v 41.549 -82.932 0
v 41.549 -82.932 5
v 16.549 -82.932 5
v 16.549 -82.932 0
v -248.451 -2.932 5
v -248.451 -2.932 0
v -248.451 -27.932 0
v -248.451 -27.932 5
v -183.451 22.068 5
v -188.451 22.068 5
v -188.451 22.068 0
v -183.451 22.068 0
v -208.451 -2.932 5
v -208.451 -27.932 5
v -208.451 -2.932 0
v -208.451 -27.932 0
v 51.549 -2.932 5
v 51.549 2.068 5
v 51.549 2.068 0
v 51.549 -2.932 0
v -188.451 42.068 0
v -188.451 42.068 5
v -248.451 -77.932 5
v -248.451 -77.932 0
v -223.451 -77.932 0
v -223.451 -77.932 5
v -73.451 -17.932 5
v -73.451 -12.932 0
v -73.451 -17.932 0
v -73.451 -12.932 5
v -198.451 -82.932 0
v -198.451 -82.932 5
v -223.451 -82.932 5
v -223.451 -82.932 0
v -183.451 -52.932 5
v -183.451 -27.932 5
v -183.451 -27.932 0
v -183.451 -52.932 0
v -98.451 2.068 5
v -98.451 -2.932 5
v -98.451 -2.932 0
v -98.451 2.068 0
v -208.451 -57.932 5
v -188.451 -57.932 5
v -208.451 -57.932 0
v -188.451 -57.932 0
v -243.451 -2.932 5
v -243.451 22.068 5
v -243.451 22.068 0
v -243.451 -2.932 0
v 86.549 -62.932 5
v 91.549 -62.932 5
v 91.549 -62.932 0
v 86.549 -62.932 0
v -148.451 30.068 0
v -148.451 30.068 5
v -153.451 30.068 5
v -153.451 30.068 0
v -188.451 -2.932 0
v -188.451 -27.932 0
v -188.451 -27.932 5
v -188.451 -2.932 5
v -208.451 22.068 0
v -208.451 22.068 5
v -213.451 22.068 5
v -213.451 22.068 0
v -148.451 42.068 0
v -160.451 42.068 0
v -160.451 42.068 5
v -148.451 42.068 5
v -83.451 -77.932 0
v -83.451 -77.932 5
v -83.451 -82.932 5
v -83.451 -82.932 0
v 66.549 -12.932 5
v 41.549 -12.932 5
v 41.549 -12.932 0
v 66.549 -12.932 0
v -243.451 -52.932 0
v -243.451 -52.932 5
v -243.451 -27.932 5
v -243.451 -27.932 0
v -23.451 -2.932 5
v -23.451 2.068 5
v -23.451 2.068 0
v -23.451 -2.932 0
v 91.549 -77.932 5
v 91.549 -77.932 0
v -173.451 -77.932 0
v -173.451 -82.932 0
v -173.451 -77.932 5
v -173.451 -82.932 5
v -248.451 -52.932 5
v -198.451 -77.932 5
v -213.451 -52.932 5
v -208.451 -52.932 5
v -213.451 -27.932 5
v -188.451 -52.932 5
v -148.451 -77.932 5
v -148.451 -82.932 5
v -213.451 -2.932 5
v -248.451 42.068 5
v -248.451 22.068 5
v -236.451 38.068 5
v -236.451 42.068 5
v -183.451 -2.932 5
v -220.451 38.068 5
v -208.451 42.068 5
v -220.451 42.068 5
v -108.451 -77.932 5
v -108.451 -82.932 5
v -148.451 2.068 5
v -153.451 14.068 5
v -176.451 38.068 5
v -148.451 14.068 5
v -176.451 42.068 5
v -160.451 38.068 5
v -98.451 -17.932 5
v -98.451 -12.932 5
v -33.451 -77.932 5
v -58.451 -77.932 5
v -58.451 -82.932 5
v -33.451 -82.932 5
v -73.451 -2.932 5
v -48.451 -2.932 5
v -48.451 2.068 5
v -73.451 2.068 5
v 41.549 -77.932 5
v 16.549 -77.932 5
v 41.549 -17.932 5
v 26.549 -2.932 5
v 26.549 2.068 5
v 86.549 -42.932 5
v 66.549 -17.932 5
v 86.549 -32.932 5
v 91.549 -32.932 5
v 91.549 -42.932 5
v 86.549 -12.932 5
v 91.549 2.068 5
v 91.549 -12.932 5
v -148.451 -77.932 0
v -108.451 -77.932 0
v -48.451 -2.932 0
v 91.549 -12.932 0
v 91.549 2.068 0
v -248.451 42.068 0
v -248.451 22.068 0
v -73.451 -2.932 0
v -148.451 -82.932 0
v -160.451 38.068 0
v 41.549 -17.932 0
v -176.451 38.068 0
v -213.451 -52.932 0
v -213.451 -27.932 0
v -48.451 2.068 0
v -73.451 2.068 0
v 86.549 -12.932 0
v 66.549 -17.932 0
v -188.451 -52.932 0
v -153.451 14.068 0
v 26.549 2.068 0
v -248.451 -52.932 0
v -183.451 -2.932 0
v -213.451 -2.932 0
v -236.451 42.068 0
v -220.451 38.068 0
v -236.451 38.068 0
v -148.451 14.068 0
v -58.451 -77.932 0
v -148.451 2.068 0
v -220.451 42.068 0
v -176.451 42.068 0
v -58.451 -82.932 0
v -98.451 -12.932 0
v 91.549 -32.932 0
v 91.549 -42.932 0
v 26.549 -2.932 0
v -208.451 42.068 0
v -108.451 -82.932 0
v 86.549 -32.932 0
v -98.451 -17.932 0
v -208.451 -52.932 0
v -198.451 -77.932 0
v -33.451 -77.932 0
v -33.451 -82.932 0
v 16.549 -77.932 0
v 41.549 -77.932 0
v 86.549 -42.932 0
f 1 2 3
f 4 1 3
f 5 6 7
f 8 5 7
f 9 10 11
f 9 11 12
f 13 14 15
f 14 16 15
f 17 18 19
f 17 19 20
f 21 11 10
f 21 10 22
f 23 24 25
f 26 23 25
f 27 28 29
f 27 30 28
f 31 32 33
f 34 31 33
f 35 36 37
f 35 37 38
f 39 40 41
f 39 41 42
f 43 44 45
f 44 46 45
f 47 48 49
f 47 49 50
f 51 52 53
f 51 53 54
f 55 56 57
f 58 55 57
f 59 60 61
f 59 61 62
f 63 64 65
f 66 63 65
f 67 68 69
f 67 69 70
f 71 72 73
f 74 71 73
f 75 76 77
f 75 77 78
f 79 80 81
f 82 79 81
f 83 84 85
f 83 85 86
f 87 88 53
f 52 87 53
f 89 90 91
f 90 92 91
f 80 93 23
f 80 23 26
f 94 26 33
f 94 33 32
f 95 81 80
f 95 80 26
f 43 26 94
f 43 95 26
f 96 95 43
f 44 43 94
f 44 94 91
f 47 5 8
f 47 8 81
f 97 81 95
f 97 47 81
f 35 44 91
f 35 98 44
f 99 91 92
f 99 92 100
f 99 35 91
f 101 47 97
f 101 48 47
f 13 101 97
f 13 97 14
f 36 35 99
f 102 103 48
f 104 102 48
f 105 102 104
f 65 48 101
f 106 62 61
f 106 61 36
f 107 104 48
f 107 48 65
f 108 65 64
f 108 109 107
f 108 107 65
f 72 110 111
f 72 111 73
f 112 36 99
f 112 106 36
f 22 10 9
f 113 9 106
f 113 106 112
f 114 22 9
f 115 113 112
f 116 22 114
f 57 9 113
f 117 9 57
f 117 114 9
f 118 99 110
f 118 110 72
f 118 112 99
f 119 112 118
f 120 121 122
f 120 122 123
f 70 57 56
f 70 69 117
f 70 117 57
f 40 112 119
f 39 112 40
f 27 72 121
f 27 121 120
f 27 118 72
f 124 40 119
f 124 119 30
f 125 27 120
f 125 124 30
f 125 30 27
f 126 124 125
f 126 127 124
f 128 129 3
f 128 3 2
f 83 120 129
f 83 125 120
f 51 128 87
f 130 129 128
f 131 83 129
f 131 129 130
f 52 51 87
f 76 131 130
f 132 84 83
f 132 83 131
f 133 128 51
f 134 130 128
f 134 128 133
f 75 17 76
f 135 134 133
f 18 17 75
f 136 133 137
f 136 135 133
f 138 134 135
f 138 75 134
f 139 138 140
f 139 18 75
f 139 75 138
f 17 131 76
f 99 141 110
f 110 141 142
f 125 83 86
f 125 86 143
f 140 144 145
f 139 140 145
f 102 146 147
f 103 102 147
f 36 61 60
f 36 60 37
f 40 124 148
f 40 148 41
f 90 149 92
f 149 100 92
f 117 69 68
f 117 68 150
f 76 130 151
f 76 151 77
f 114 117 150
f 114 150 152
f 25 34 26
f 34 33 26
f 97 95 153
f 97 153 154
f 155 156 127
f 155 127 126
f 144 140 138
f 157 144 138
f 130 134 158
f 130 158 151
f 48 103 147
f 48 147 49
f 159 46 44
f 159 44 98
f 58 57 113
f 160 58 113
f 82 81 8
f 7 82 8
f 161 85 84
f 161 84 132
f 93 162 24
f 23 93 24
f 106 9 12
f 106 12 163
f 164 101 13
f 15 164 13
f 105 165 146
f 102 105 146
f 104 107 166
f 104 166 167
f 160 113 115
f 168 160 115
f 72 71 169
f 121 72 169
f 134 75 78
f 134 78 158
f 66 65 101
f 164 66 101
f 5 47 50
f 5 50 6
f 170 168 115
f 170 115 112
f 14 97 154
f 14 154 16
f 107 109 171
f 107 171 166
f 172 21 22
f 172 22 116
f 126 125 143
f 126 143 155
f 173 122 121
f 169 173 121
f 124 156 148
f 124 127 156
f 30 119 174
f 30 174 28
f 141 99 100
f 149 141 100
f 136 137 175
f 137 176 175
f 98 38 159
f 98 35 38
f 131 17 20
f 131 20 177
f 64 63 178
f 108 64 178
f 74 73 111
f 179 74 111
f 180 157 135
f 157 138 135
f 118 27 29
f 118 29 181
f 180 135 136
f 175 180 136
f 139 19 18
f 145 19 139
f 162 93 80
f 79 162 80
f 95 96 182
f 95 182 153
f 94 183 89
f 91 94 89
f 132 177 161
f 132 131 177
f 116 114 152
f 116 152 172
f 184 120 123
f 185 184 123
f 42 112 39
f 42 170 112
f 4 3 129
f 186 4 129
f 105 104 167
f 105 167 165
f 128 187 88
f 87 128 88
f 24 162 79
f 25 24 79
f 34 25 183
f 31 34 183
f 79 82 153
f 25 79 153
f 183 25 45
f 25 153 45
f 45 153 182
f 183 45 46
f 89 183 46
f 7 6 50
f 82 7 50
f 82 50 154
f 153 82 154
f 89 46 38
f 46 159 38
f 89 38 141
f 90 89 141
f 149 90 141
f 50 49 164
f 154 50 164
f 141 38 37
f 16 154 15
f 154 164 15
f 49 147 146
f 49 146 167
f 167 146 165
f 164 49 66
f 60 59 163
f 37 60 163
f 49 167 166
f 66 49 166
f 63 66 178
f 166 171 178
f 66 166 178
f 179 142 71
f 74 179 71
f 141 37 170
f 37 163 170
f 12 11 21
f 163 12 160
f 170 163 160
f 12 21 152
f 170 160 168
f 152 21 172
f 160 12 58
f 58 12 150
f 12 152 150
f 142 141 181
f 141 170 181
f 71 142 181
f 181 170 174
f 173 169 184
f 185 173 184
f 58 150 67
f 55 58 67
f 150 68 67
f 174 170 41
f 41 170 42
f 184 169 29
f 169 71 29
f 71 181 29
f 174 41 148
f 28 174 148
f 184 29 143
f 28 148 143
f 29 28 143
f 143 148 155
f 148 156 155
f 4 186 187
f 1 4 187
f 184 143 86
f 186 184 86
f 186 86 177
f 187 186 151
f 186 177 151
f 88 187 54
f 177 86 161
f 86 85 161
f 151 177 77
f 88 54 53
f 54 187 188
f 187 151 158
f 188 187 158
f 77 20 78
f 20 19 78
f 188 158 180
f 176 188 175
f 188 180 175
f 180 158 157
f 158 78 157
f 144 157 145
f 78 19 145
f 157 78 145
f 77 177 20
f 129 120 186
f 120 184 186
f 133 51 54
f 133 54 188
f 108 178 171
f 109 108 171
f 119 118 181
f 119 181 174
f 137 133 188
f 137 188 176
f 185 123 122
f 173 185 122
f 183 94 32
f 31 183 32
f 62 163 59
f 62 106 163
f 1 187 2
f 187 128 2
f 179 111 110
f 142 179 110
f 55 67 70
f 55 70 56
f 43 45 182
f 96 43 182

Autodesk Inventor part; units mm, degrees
ref_plane "YZ Plane" through (0, 0, 0) normal (1, 0, 0) x (0, 1, 0)
ref_plane "XZ Plane" through (0, 0, 0) normal (0, 1, 0) x (-1, 0, 0)
ref_plane "XY Plane" through (0, 0, 0) normal (0, 0, 1) x (1, 0, 0)
sketch "Sketch1" plane through (0, 0, 0) normal (0, 0, 1) x (1, 0, 0)
  line L0 (-188.4506, 42.0684) -> (-148.4506, 42.0684)
  line L1 (-148.4506, 42.0684) -> (-148.4506, 2.0684)
  line L2 (-148.4506, 2.0684) -> (91.5494, 2.0684)
  line L3 (-198.4506, -77.9316) -> (91.5494, -77.9316)
  line L4 (91.5494, -77.9316) -> (91.5494, 2.0684)
  line L5 (-188.4506, -57.9316) -> (-208.4506, -57.9316)
  line L6 (-208.4506, -57.9316) -> (-208.4506, 42.0684)
  line L7 (-208.4506, 42.0684) -> (-248.4506, 42.0684)
  line L8 (-248.4506, 42.0684) -> (-248.4506, -77.9316)
  line L9 (-248.4506, -77.9316) -> (-198.4506, -77.9316)
  line L10 (-188.4506, -57.9316) -> (-188.4506, 42.0684)
  point P0 (0, 0)
  dimension "d2" = 80
  dimension "d3" = 40
  dimension "d23" = 40
  dimension "d24" = 20
  dimension "d26" = 20
  dimension "d27" = 120
  dimension "d28" = 120
  dimension "d58" = 280
extrude "Extrusion1" add sketch "Sketch1" along normal blind 5
sketch "Sketch2" plane through (0, 0, 5) normal (0, 0, 1) x (1, 0, 0)
  line L0 (91.5494, 2.0684) -> (-148.4506, 2.0684) projected
  line L1 (-148.4506, 2.0684) -> (-148.4506, 42.0684) projected
  line L2 (-148.4506, 42.0684) -> (-188.4506, 42.0684) projected
  line L3 (-248.4506, -77.9316) -> (91.5494, -77.9316) projected
  line L4 (91.5494, -77.9316) -> (91.5494, 2.0684) projected
  line L5 (91.5494, 2.0684) -> (-148.4506, 2.0684) projected
  line L6 (-98.4506, 2.0684) -> (-73.4506, 2.0684)
  line L7 (-73.4506, 2.0684) -> (-73.4506, -2.9316)
  line L8 (-73.4506, -2.9316) -> (-98.4506, -2.9316)
  line L9 (-98.4506, -2.9316) -> (-98.4506, 2.0684)
  line L10 (-48.4506, 2.0684) -> (-23.4506, 2.0684)
  line L11 (-23.4506, 2.0684) -> (-23.4506, -2.9316)
  line L12 (-23.4506, -2.9316) -> (-48.4506, -2.9316)
  line L13 (-48.4506, -2.9316) -> (-48.4506, 2.0684)
  line L14 (26.5494, 2.0684) -> (51.5494, 2.0684)
  line L15 (51.5494, 2.0684) -> (51.5494, -2.9316)
  line L16 (51.5494, -2.9316) -> (26.5494, -2.9316)
  line L17 (26.5494, -2.9316) -> (26.5494, 2.0684)
  line L18 (-148.4506, 42.0684) -> (-188.4506, 42.0684) projected
  line L19 (91.5494, -77.9316) -> (91.5494, 2.0684) projected
  line L20 (-73.4506, -7.9316) -> (-73.4506, -2.9316)
  line L21 (-98.4506, -2.9316) -> (-98.4506, -7.9316)
  line L22 (-23.4506, -7.9316) -> (-23.4506, -2.9316)
  line L23 (-48.4506, -2.9316) -> (-48.4506, -7.9316)
  line L24 (51.5494, -7.9316) -> (51.5494, -2.9316)
  line L25 (26.5494, -2.9316) -> (26.5494, -7.9316)
  line L26 (41.5494, -77.9316) -> (41.5494, -72.9316)
  line L27 (41.5494, -72.9316) -> (16.5494, -72.9316)
  line L28 (16.5494, -72.9316) -> (16.5494, -77.9316)
  line L29 (16.5494, -72.9316) -> (16.5494, -67.9316)
  line L30 (41.5494, -67.9316) -> (41.5494, -72.9316)
  line L31 (-188.4506, -57.9316) -> (-208.4506, -57.9316) projected
  line L32 (-208.4506, -57.9316) -> (-208.4506, 42.0684) projected
  line L33 (-208.4506, 42.0684) -> (-248.4506, 42.0684) projected
  line L34 (-248.4506, 42.0684) -> (-248.4506, -77.9316) projected
  line L35 (-188.4506, 42.0684) -> (-188.4506, -57.9316) projected
  line L36 (-208.4506, 42.0684) -> (-248.4506, 42.0684) projected
  line L37 (-236.4506, 42.0684) -> (-220.4506, 42.0684)
  line L38 (-220.4506, 42.0684) -> (-220.4506, 38.0682)
  line L39 (-220.4506, 38.0682) -> (-236.4506, 38.0682)
  line L40 (-236.4506, 38.0682) -> (-236.4506, 42.0684)
  line L41 (-148.4506, 42.0684) -> (-188.4506, 42.0684) projected
  line L42 (-176.4506, 42.0684) -> (-160.4506, 42.0684)
  line L43 (-160.4506, 42.0684) -> (-160.4506, 38.0682)
  line L44 (-160.4506, 38.0682) -> (-176.4506, 38.0682)
  line L45 (-176.4506, 38.0682) -> (-176.4506, 42.0684)
  line L46 (-248.4506, 42.0684) -> (-248.4506, -77.9316) projected
  line L47 (-248.4506, 22.0684) -> (-243.4506, 22.0684)
  line L48 (-243.4506, 22.0684) -> (-243.4506, -2.9316)
  line L49 (-243.4506, -2.9316) -> (-248.4506, -2.9316)
  line L50 (-248.4506, -2.9316) -> (-248.4506, 22.0684)
  line L51 (-248.4506, -52.9316) -> (-243.4506, -52.9316)
  line L52 (-243.4506, -52.9316) -> (-243.4506, -27.9316)
  line L53 (-243.4506, -27.9316) -> (-248.4506, -27.9316)
  line L54 (-248.4506, -27.9316) -> (-248.4506, -52.9316)
  line L55 (-188.4506, 42.0684) -> (-188.4506, -57.9316) projected
  line L56 (-188.4506, 22.0684) -> (-183.4506, 22.0684)
  line L57 (-183.4506, 22.0684) -> (-183.4506, -2.9316)
  line L58 (-183.4506, -2.9316) -> (-188.4506, -2.9316)
  line L59 (-188.4506, -2.9316) -> (-188.4506, 22.0684)
  line L60 (-188.4506, -27.9316) -> (-183.4506, -27.9316)
  line L61 (-183.4506, -27.9316) -> (-183.4506, -52.9316)
  line L62 (-183.4506, -52.9316) -> (-188.4506, -52.9316)
  line L63 (-188.4506, -52.9316) -> (-188.4506, -27.9316)
  line L64 (-208.4506, -57.9316) -> (-208.4506, 42.0684) projected
  line L65 (-208.4506, 22.0684) -> (-213.4506, 22.0684)
  line L66 (-213.4506, 22.0684) -> (-213.4506, -2.9316)
  line L67 (-213.4506, -2.9316) -> (-208.4506, -2.9316)
  line L68 (-208.4506, -2.9316) -> (-208.4506, 22.0684)
  line L69 (-208.4506, -52.9316) -> (-213.4506, -52.9316)
  line L70 (-213.4506, -52.9316) -> (-213.4506, -27.9316)
  line L71 (-213.4506, -27.9316) -> (-208.4506, -27.9316)
  line L72 (-208.4506, -27.9316) -> (-208.4506, -52.9316)
  line L73 (-148.4506, 2.0684) -> (-148.4506, 42.0684) projected
  line L74 (-148.4506, 30.0684) -> (-153.4506, 30.0684)
  line L75 (-153.4506, 30.0684) -> (-153.4506, 14.0684)
  line L76 (-153.4506, 14.0684) -> (-148.4506, 14.0684)
  line L77 (-148.4506, 14.0684) -> (-148.4506, 30.0684)
  line L78 (-248.4506, -77.9316) -> (91.5494, -77.9316) projected
  line L79 (-223.4506, -77.9316) -> (-198.4506, -77.9316)
  line L80 (-198.4506, -77.9316) -> (-198.4506, -72.9316)
  line L81 (-198.4506, -72.9316) -> (-223.4506, -72.9316)
  line L82 (-223.4506, -72.9316) -> (-223.4506, -77.9316)
  line L83 (-173.4506, -77.9316) -> (-148.4506, -77.9316)
  line L84 (-148.4506, -77.9316) -> (-148.4506, -72.9316)
  line L85 (-148.4506, -72.9316) -> (-173.4506, -72.9316)
  line L86 (-173.4506, -72.9316) -> (-173.4506, -77.9316)
  line L87 (-108.4506, -77.9316) -> (-83.4506, -77.9316)
  line L88 (-83.4506, -77.9316) -> (-83.4506, -72.9316)
  line L89 (-83.4506, -72.9316) -> (-108.4506, -72.9316)
  line L90 (-108.4506, -72.9316) -> (-108.4506, -77.9316)
  line L91 (-58.4506, -77.9316) -> (-33.4506, -77.9316)
  line L92 (-33.4506, -77.9316) -> (-33.4506, -72.9316)
  line L93 (-33.4506, -72.9316) -> (-58.4506, -72.9316)
  line L94 (-58.4506, -72.9316) -> (-58.4506, -77.9316)
  line L95 (91.5494, -12.9316) -> (86.5494, -12.9316)
  line L96 (86.5494, -12.9316) -> (86.5494, -32.9316)
  line L97 (86.5494, -32.9316) -> (91.5494, -32.9316)
  line L98 (91.5494, -32.9316) -> (91.5494, -12.9316)
  line L99 (91.5494, -62.9316) -> (86.5494, -62.9316)
  line L100 (86.5494, -62.9316) -> (86.5494, -42.9316)
  line L101 (86.5494, -42.9316) -> (91.5494, -42.9316)
  line L102 (91.5494, -42.9316) -> (91.5494, -62.9316)
  point P0 (0, 0)
  point P1 (0, -75.8632)
  point P2 (91.5494, -32.9316)
  point P3 (91.5494, -12.9316)
  point P4 (51.5494, 2.0684)
  point P5 (26.5494, 2.0684)
  point P6 (-23.4506, 2.0684)
  point P7 (-48.4506, 2.0684)
  point P8 (-73.4506, 2.0684)
  point P9 (-98.4506, 2.0684)
  point P10 (-188.4506, -27.9316)
  point P11 (-148.4506, 14.0684)
  point P12 (-148.4506, 30.0684)
  point P13 (-188.4506, -2.9316)
  point P14 (-160.4506, 42.0684)
  point P15 (-176.4506, 42.0684)
  point P16 (-208.4506, -2.9316)
  dimension "d6" = 25
  dimension "d7" = 5
  dimension "d8" = 25
  dimension "d9" = 25
  dimension "d10" = 5
  dimension "d20" = 40
  dimension "d21" = 50
  dimension "d22" = 25
  dimension "d29" = 5
  dimension "d30" = 25
  dimension "d31" = 5
  dimension "d32" = 25
  dimension "d33" = 25
  dimension "d34" = 25
  dimension "d35" = 5
  dimension "d36" = 5
  dimension "d37" = 5
  dimension "d38" = 16
  dimension "d39" = 12
  dimension "d40" = 25
  dimension "d41" = 5
  dimension "d42" = 25
  dimension "d44" = 25
  dimension "d45" = 25
  dimension "d46" = 5
  dimension "d47" = 5
  dimension "d48" = 20
  dimension "d49" = 20
  dimension "d50" = 10
  dimension "d51" = 15
  dimension "d54" = 12
  dimension "d55" = 16
  dimension "d56" = 16
  dimension "d57" = 12
extrude "Extrusion2" cut sketch "Sketch2" against normal blind 5 contours L15 L16 L17 L0 | L4 L97 L96 L95 | L11 L12 L13 L0 | L4 L99 L100 L101 | L7 L8 L9 L0 | L3 L28 L27 L26 | L76 L75 L74 L1 | L3 L94 L93 L92 | L3 L90 L89 L88 | L43 L44 L45 L2 | L3 L86 L85 L84 | L56 L57 L58 L35 | L3 L82 L81 L80 | L60 L61 L62 L35 | L34 L53 L52 L51 | L34 L47 L48 L49 | L69 L70 L71 L32 | L67 L66 L65 L32 | L33 L38 L39 L40
sketch "Sketch3" plane through (0, 0, 5) normal (0, 0, 1) x (1, 0, 0)
  line L0 (-176.4506, 38.0682) -> (-176.4506, 42.0684) projected
  line L1 (-176.4506, 42.0684) -> (-188.4506, 42.0684) projected
  line L2 (-188.4506, 42.0684) -> (-188.4506, 22.0684) projected
  line L3 (-188.4506, 22.0684) -> (-183.4506, 22.0684) projected
  line L4 (-183.4506, 22.0684) -> (-183.4506, -2.9316) projected
  line L5 (-183.4506, -2.9316) -> (-188.4506, -2.9316) projected
  line L6 (-188.4506, -2.9316) -> (-188.4506, -27.9316) projected
  line L7 (-188.4506, -27.9316) -> (-183.4506, -27.9316) projected
  line L8 (-183.4506, -27.9316) -> (-183.4506, -52.9316) projected
  line L9 (-183.4506, -52.9316) -> (-188.4506, -52.9316) projected
  line L10 (-188.4506, -52.9316) -> (-188.4506, -57.9316) projected
  line L11 (-188.4506, -57.9316) -> (-208.4506, -57.9316) projected
  line L12 (-208.4506, -57.9316) -> (-208.4506, -52.9316) projected
  line L13 (-208.4506, -52.9316) -> (-213.4506, -52.9316) projected
  line L14 (-213.4506, -52.9316) -> (-213.4506, -27.9316) projected
  line L15 (-213.4506, -27.9316) -> (-208.4506, -27.9316) projected
  line L16 (-208.4506, -27.9316) -> (-208.4506, -2.9316) projected
  line L17 (-208.4506, -2.9316) -> (-213.4506, -2.9316) projected
  line L18 (-213.4506, -2.9316) -> (-213.4506, 22.0684) projected
  line L19 (-213.4506, 22.0684) -> (-208.4506, 22.0684) projected
  line L20 (-208.4506, 22.0684) -> (-208.4506, 42.0684) projected
  line L21 (-208.4506, 42.0684) -> (-220.4506, 42.0684) projected
  line L22 (-220.4506, 42.0684) -> (-220.4506, 38.0682) projected
  line L23 (-220.4506, 38.0682) -> (-236.4506, 38.0682) projected
  line L24 (-236.4506, 38.0682) -> (-236.4506, 42.0684) projected
  line L25 (-236.4506, 42.0684) -> (-248.4506, 42.0684) projected
  line L26 (-248.4506, 42.0684) -> (-248.4506, 22.0684) projected
  line L27 (-248.4506, 22.0684) -> (-243.4506, 22.0684) projected
  line L28 (-243.4506, 22.0684) -> (-243.4506, -2.9316) projected
  line L29 (-243.4506, -2.9316) -> (-248.4506, -2.9316) projected
  line L30 (-248.4506, -2.9316) -> (-248.4506, -27.9316) projected
  line L31 (-248.4506, -27.9316) -> (-243.4506, -27.9316) projected
  line L32 (-243.4506, -27.9316) -> (-243.4506, -52.9316) projected
  line L33 (-243.4506, -52.9316) -> (-248.4506, -52.9316) projected
  line L34 (-248.4506, -52.9316) -> (-248.4506, -77.9316) projected
  line L35 (-248.4506, -77.9316) -> (-223.4506, -77.9316) projected
  line L36 (-223.4506, -77.9316) -> (-223.4506, -72.9316) projected
  line L37 (-223.4506, -72.9316) -> (-198.4506, -72.9316) projected
  line L38 (-198.4506, -72.9316) -> (-198.4506, -77.9316) projected
  line L39 (-198.4506, -77.9316) -> (-173.4506, -77.9316) projected
  line L40 (-173.4506, -77.9316) -> (-173.4506, -72.9316) projected
  line L41 (-173.4506, -72.9316) -> (-148.4506, -72.9316) projected
  line L42 (-148.4506, -72.9316) -> (-148.4506, -77.9316) projected
  line L43 (-148.4506, -77.9316) -> (-108.4506, -77.9316) projected
  line L44 (-108.4506, -77.9316) -> (-108.4506, -72.9316) projected
  line L45 (-108.4506, -72.9316) -> (-83.4506, -72.9316) projected
  line L46 (-83.4506, -72.9316) -> (-83.4506, -77.9316) projected
  line L47 (-83.4506, -77.9316) -> (-58.4506, -77.9316) projected
  line L48 (-58.4506, -77.9316) -> (-58.4506, -72.9316) projected
  line L49 (-58.4506, -72.9316) -> (-33.4506, -72.9316) projected
  line L50 (-33.4506, -72.9316) -> (-33.4506, -77.9316) projected
  line L51 (-33.4506, -77.9316) -> (16.5494, -77.9316) projected
  line L52 (16.5494, -77.9316) -> (16.5494, -72.9316) projected
  line L53 (16.5494, -72.9316) -> (41.5494, -72.9316) projected
  line L54 (41.5494, -72.9316) -> (41.5494, -77.9316) projected
  line L55 (41.5494, -77.9316) -> (91.5494, -77.9316) projected
  line L56 (91.5494, -77.9316) -> (91.5494, -62.9316) projected
  line L57 (91.5494, -62.9316) -> (86.5494, -62.9316) projected
  line L58 (86.5494, -62.9316) -> (86.5494, -42.9316) projected
  line L59 (86.5494, -42.9316) -> (91.5494, -42.9316) projected
  line L60 (91.5494, -42.9316) -> (91.5494, -32.9316) projected
  line L61 (91.5494, -32.9316) -> (86.5494, -32.9316) projected
  line L62 (86.5494, -32.9316) -> (86.5494, -12.9316) projected
  line L63 (86.5494, -12.9316) -> (91.5494, -12.9316) projected
  line L64 (91.5494, -12.9316) -> (91.5494, 2.0684) projected
  line L65 (91.5494, 2.0684) -> (51.5494, 2.0684) projected
  line L66 (51.5494, 2.0684) -> (51.5494, -2.9316) projected
  line L67 (51.5494, -2.9316) -> (26.5494, -2.9316) projected
  line L68 (26.5494, -2.9316) -> (26.5494, 2.0684) projected
  line L69 (26.5494, 2.0684) -> (-23.4506, 2.0684) projected
  line L70 (-23.4506, 2.0684) -> (-23.4506, -2.9316) projected
  line L71 (-23.4506, -2.9316) -> (-48.4506, -2.9316) projected
  line L72 (-48.4506, -2.9316) -> (-48.4506, 2.0684) projected
  line L73 (-48.4506, 2.0684) -> (-73.4506, 2.0684) projected
  line L74 (-73.4506, 2.0684) -> (-73.4506, -2.9316) projected
  line L75 (-73.4506, -2.9316) -> (-98.4506, -2.9316) projected
  line L76 (-98.4506, -2.9316) -> (-98.4506, 2.0684) projected
  line L77 (-98.4506, 2.0684) -> (-148.4506, 2.0684) projected
  line L78 (-148.4506, 2.0684) -> (-148.4506, 14.0684) projected
  line L79 (-148.4506, 14.0684) -> (-153.4506, 14.0684) projected
  line L80 (-153.4506, 14.0684) -> (-153.4506, 30.0684) projected
  line L81 (-153.4506, 30.0684) -> (-148.4506, 30.0684) projected
  line L82 (-148.4506, 30.0684) -> (-148.4506, 42.0684) projected
  line L83 (-148.4506, 42.0684) -> (-160.4506, 42.0684) projected
  line L84 (-160.4506, 42.0684) -> (-160.4506, 38.0682) projected
  line L85 (-160.4506, 38.0682) -> (-176.4506, 38.0682) projected
  line L86 (-223.4506, -72.9316) -> (-198.4506, -72.9316)
  line L87 (-198.4506, -72.9316) -> (-198.4506, -82.9316)
  line L88 (-198.4506, -82.9316) -> (-223.4506, -82.9316)
  line L89 (-223.4506, -82.9316) -> (-223.4506, -72.9316)
  line L90 (-148.4506, -72.9316) -> (-173.4506, -72.9316) projected
  line L91 (-173.4506, -72.9316) -> (-148.4506, -72.9316)
  line L92 (-148.4506, -72.9316) -> (-148.4506, -82.9316)
  line L93 (-148.4506, -82.9316) -> (-173.4506, -82.9316)
  line L94 (-173.4506, -82.9316) -> (-173.4506, -72.9316)
  line L95 (-108.4506, -72.9316) -> (-83.4506, -72.9316)
  line L96 (-83.4506, -72.9316) -> (-83.4506, -82.9316)
  line L97 (-83.4506, -82.9316) -> (-108.4506, -82.9316)
  line L98 (-108.4506, -82.9316) -> (-108.4506, -72.9316)
  line L99 (-33.4506, -72.9316) -> (-58.4506, -72.9316) projected
  line L100 (-58.4506, -72.9316) -> (-33.4506, -72.9316)
  line L101 (-33.4506, -72.9316) -> (-33.4506, -82.9316)
  line L102 (-33.4506, -82.9316) -> (-58.4506, -82.9316)
  line L103 (-58.4506, -82.9316) -> (-58.4506, -72.9316)
  line L104 (16.5494, -72.9316) -> (41.5494, -72.9316) projected
  line L105 (16.5494, -72.9316) -> (41.5494, -72.9316)
  line L106 (41.5494, -72.9316) -> (41.5494, -82.9316)
  line L107 (41.5494, -82.9316) -> (16.5494, -82.9316)
  line L108 (16.5494, -82.9316) -> (16.5494, -72.9316)
  point P0 (0, 0)
  dimension "d59" = 10
  dimension "d60" = 10
  dimension "d61" = 10
  dimension "d62" = 10
  dimension "d63" = 10
extrude "Extrusion3" add sketch "Sketch3" against normal blind 5 contours L106 L107 L108 L52 L53 L54 | L101 L102 L103 L48 L49 L50 | L36 L37 L38 L87 L88 L89 | L96 L97 L98 L44 L45 L46 | L40 L41 L42 L92 L93 L94
sketch "Sketch4" plane through (0, 0, 5) normal (0, 0, 1) x (1, 0, 0)
  line L0 (-176.4506, 38.0682) -> (-176.4506, 42.0684) projected
  line L1 (-176.4506, 42.0684) -> (-188.4506, 42.0684) projected
  line L2 (-188.4506, 42.0684) -> (-188.4506, 22.0684) projected
  line L3 (-188.4506, 22.0684) -> (-183.4506, 22.0684) projected
  line L4 (-183.4506, 22.0684) -> (-183.4506, -2.9316) projected
  line L5 (-183.4506, -2.9316) -> (-188.4506, -2.9316) projected
  line L6 (-188.4506, -2.9316) -> (-188.4506, -27.9316) projected
  line L7 (-188.4506, -27.9316) -> (-183.4506, -27.9316) projected
  line L8 (-183.4506, -27.9316) -> (-183.4506, -52.9316) projected
  line L9 (-183.4506, -52.9316) -> (-188.4506, -52.9316) projected
  line L10 (-188.4506, -52.9316) -> (-188.4506, -57.9316) projected
  line L11 (-188.4506, -57.9316) -> (-208.4506, -57.9316) projected
  line L12 (-208.4506, -57.9316) -> (-208.4506, -52.9316) projected
  line L13 (-208.4506, -52.9316) -> (-213.4506, -52.9316) projected
  line L14 (-213.4506, -52.9316) -> (-213.4506, -27.9316) projected
  line L15 (-213.4506, -27.9316) -> (-208.4506, -27.9316) projected
  line L16 (-208.4506, -27.9316) -> (-208.4506, -2.9316) projected
  line L17 (-208.4506, -2.9316) -> (-213.4506, -2.9316) projected
  line L18 (-213.4506, -2.9316) -> (-213.4506, 22.0684) projected
  line L19 (-213.4506, 22.0684) -> (-208.4506, 22.0684) projected
  line L20 (-208.4506, 22.0684) -> (-208.4506, 42.0684) projected
  line L21 (-208.4506, 42.0684) -> (-220.4506, 42.0684) projected
  line L22 (-220.4506, 42.0684) -> (-220.4506, 38.0682) projected
  line L23 (-220.4506, 38.0682) -> (-236.4506, 38.0682) projected
  line L24 (-236.4506, 38.0682) -> (-236.4506, 42.0684) projected
  line L25 (-236.4506, 42.0684) -> (-248.4506, 42.0684) projected
  line L26 (-248.4506, 42.0684) -> (-248.4506, 22.0684) projected
  line L27 (-248.4506, 22.0684) -> (-243.4506, 22.0684) projected
  line L28 (-243.4506, 22.0684) -> (-243.4506, -2.9316) projected
  line L29 (-243.4506, -2.9316) -> (-248.4506, -2.9316) projected
  line L30 (-248.4506, -2.9316) -> (-248.4506, -27.9316) projected
  line L31 (-248.4506, -27.9316) -> (-243.4506, -27.9316) projected
  line L32 (-243.4506, -27.9316) -> (-243.4506, -52.9316) projected
  line L33 (-243.4506, -52.9316) -> (-248.4506, -52.9316) projected
  line L34 (-248.4506, -52.9316) -> (-248.4506, -77.9316) projected
  line L35 (-248.4506, -77.9316) -> (-223.4506, -77.9316) projected
  line L36 (-223.4506, -77.9316) -> (-223.4506, -82.9316) projected
  line L37 (-223.4506, -82.9316) -> (-198.4506, -82.9316) projected
  line L38 (-198.4506, -82.9316) -> (-198.4506, -77.9316) projected
  line L39 (-198.4506, -77.9316) -> (-173.4506, -77.9316) projected
  line L40 (-173.4506, -77.9316) -> (-173.4506, -82.9316) projected
  line L41 (-173.4506, -82.9316) -> (-148.4506, -82.9316) projected
  line L42 (-148.4506, -82.9316) -> (-148.4506, -77.9316) projected
  line L43 (-148.4506, -77.9316) -> (-108.4506, -77.9316) projected
  line L44 (-108.4506, -77.9316) -> (-108.4506, -82.9316) projected
  line L45 (-108.4506, -82.9316) -> (-83.4506, -82.9316) projected
  line L46 (-83.4506, -82.9316) -> (-83.4506, -77.9316) projected
  line L47 (-83.4506, -77.9316) -> (-58.4506, -77.9316) projected
  line L48 (-58.4506, -77.9316) -> (-58.4506, -82.9316) projected
  line L49 (-58.4506, -82.9316) -> (-33.4506, -82.9316) projected
  line L50 (-33.4506, -82.9316) -> (-33.4506, -77.9316) projected
  line L51 (-33.4506, -77.9316) -> (16.5494, -77.9316) projected
  line L52 (16.5494, -77.9316) -> (16.5494, -82.9316) projected
  line L53 (16.5494, -82.9316) -> (41.5494, -82.9316) projected
  line L54 (41.5494, -82.9316) -> (41.5494, -77.9316) projected
  line L55 (41.5494, -77.9316) -> (91.5494, -77.9316) projected
  line L56 (91.5494, -77.9316) -> (91.5494, -62.9316) projected
  line L57 (91.5494, -62.9316) -> (86.5494, -62.9316) projected
  line L58 (86.5494, -62.9316) -> (86.5494, -42.9316) projected
  line L59 (86.5494, -42.9316) -> (91.5494, -42.9316) projected
  line L60 (91.5494, -42.9316) -> (91.5494, -32.9316) projected
  line L61 (91.5494, -32.9316) -> (86.5494, -32.9316) projected
  line L62 (86.5494, -32.9316) -> (86.5494, -12.9316) projected
  line L63 (86.5494, -12.9316) -> (91.5494, -12.9316) projected
  line L64 (91.5494, -12.9316) -> (91.5494, 2.0684) projected
  line L65 (91.5494, 2.0684) -> (51.5494, 2.0684) projected
  line L66 (51.5494, 2.0684) -> (51.5494, -2.9316) projected
  line L67 (51.5494, -2.9316) -> (26.5494, -2.9316) projected
  line L68 (26.5494, -2.9316) -> (26.5494, 2.0684) projected
  line L69 (26.5494, 2.0684) -> (-23.4506, 2.0684) projected
  line L70 (-23.4506, 2.0684) -> (-23.4506, -2.9316) projected
  line L71 (-23.4506, -2.9316) -> (-48.4506, -2.9316) projected
  line L72 (-48.4506, -2.9316) -> (-48.4506, 2.0684) projected
  line L73 (-48.4506, 2.0684) -> (-73.4506, 2.0684) projected
  line L74 (-73.4506, 2.0684) -> (-73.4506, -2.9316) projected
  line L75 (-73.4506, -2.9316) -> (-98.4506, -2.9316) projected
  line L76 (-98.4506, -2.9316) -> (-98.4506, 2.0684) projected
  line L77 (-98.4506, 2.0684) -> (-148.4506, 2.0684) projected
  line L78 (-148.4506, 2.0684) -> (-148.4506, 14.0684) projected
  line L79 (-148.4506, 14.0684) -> (-153.4506, 14.0684) projected
  line L80 (-153.4506, 14.0684) -> (-153.4506, 30.0684) projected
  line L81 (-153.4506, 30.0684) -> (-148.4506, 30.0684) projected
  line L82 (-148.4506, 30.0684) -> (-148.4506, 42.0684) projected
  line L83 (-148.4506, 42.0684) -> (-160.4506, 42.0684) projected
  line L84 (-160.4506, 42.0684) -> (-160.4506, 38.0682) projected
  line L85 (-160.4506, 38.0682) -> (-176.4506, 38.0682) projected
  line L86 (-98.4506, -12.9316) -> (-73.4506, -12.9316)
  line L87 (-73.4506, -12.9316) -> (-73.4506, -17.9316)
  line L88 (-73.4506, -17.9316) -> (-98.4506, -17.9316)
  line L89 (-98.4506, -17.9316) -> (-98.4506, -12.9316)
  line L90 (41.5494, -12.9316) -> (66.5494, -12.9316)
  line L91 (66.5494, -12.9316) -> (66.5494, -17.9316)
  line L92 (66.5494, -17.9316) -> (41.5494, -17.9316)
  line L93 (41.5494, -17.9316) -> (41.5494, -12.9316)
  point P0 (0, 0)
  dimension "d66" = 25
  dimension "d67" = 5
  dimension "d68" = 25
  dimension "d69" = 5
  dimension "d70" = 50
  dimension "d71" = 25
  dimension "d72" = 60
  dimension "d73" = 60
extrude "Extrusion4" cut sketch "Sketch4" against normal blind 5 contours L86 L87 L88 L89 | L90 L91 L92 L93
properties part number "Frontal"
